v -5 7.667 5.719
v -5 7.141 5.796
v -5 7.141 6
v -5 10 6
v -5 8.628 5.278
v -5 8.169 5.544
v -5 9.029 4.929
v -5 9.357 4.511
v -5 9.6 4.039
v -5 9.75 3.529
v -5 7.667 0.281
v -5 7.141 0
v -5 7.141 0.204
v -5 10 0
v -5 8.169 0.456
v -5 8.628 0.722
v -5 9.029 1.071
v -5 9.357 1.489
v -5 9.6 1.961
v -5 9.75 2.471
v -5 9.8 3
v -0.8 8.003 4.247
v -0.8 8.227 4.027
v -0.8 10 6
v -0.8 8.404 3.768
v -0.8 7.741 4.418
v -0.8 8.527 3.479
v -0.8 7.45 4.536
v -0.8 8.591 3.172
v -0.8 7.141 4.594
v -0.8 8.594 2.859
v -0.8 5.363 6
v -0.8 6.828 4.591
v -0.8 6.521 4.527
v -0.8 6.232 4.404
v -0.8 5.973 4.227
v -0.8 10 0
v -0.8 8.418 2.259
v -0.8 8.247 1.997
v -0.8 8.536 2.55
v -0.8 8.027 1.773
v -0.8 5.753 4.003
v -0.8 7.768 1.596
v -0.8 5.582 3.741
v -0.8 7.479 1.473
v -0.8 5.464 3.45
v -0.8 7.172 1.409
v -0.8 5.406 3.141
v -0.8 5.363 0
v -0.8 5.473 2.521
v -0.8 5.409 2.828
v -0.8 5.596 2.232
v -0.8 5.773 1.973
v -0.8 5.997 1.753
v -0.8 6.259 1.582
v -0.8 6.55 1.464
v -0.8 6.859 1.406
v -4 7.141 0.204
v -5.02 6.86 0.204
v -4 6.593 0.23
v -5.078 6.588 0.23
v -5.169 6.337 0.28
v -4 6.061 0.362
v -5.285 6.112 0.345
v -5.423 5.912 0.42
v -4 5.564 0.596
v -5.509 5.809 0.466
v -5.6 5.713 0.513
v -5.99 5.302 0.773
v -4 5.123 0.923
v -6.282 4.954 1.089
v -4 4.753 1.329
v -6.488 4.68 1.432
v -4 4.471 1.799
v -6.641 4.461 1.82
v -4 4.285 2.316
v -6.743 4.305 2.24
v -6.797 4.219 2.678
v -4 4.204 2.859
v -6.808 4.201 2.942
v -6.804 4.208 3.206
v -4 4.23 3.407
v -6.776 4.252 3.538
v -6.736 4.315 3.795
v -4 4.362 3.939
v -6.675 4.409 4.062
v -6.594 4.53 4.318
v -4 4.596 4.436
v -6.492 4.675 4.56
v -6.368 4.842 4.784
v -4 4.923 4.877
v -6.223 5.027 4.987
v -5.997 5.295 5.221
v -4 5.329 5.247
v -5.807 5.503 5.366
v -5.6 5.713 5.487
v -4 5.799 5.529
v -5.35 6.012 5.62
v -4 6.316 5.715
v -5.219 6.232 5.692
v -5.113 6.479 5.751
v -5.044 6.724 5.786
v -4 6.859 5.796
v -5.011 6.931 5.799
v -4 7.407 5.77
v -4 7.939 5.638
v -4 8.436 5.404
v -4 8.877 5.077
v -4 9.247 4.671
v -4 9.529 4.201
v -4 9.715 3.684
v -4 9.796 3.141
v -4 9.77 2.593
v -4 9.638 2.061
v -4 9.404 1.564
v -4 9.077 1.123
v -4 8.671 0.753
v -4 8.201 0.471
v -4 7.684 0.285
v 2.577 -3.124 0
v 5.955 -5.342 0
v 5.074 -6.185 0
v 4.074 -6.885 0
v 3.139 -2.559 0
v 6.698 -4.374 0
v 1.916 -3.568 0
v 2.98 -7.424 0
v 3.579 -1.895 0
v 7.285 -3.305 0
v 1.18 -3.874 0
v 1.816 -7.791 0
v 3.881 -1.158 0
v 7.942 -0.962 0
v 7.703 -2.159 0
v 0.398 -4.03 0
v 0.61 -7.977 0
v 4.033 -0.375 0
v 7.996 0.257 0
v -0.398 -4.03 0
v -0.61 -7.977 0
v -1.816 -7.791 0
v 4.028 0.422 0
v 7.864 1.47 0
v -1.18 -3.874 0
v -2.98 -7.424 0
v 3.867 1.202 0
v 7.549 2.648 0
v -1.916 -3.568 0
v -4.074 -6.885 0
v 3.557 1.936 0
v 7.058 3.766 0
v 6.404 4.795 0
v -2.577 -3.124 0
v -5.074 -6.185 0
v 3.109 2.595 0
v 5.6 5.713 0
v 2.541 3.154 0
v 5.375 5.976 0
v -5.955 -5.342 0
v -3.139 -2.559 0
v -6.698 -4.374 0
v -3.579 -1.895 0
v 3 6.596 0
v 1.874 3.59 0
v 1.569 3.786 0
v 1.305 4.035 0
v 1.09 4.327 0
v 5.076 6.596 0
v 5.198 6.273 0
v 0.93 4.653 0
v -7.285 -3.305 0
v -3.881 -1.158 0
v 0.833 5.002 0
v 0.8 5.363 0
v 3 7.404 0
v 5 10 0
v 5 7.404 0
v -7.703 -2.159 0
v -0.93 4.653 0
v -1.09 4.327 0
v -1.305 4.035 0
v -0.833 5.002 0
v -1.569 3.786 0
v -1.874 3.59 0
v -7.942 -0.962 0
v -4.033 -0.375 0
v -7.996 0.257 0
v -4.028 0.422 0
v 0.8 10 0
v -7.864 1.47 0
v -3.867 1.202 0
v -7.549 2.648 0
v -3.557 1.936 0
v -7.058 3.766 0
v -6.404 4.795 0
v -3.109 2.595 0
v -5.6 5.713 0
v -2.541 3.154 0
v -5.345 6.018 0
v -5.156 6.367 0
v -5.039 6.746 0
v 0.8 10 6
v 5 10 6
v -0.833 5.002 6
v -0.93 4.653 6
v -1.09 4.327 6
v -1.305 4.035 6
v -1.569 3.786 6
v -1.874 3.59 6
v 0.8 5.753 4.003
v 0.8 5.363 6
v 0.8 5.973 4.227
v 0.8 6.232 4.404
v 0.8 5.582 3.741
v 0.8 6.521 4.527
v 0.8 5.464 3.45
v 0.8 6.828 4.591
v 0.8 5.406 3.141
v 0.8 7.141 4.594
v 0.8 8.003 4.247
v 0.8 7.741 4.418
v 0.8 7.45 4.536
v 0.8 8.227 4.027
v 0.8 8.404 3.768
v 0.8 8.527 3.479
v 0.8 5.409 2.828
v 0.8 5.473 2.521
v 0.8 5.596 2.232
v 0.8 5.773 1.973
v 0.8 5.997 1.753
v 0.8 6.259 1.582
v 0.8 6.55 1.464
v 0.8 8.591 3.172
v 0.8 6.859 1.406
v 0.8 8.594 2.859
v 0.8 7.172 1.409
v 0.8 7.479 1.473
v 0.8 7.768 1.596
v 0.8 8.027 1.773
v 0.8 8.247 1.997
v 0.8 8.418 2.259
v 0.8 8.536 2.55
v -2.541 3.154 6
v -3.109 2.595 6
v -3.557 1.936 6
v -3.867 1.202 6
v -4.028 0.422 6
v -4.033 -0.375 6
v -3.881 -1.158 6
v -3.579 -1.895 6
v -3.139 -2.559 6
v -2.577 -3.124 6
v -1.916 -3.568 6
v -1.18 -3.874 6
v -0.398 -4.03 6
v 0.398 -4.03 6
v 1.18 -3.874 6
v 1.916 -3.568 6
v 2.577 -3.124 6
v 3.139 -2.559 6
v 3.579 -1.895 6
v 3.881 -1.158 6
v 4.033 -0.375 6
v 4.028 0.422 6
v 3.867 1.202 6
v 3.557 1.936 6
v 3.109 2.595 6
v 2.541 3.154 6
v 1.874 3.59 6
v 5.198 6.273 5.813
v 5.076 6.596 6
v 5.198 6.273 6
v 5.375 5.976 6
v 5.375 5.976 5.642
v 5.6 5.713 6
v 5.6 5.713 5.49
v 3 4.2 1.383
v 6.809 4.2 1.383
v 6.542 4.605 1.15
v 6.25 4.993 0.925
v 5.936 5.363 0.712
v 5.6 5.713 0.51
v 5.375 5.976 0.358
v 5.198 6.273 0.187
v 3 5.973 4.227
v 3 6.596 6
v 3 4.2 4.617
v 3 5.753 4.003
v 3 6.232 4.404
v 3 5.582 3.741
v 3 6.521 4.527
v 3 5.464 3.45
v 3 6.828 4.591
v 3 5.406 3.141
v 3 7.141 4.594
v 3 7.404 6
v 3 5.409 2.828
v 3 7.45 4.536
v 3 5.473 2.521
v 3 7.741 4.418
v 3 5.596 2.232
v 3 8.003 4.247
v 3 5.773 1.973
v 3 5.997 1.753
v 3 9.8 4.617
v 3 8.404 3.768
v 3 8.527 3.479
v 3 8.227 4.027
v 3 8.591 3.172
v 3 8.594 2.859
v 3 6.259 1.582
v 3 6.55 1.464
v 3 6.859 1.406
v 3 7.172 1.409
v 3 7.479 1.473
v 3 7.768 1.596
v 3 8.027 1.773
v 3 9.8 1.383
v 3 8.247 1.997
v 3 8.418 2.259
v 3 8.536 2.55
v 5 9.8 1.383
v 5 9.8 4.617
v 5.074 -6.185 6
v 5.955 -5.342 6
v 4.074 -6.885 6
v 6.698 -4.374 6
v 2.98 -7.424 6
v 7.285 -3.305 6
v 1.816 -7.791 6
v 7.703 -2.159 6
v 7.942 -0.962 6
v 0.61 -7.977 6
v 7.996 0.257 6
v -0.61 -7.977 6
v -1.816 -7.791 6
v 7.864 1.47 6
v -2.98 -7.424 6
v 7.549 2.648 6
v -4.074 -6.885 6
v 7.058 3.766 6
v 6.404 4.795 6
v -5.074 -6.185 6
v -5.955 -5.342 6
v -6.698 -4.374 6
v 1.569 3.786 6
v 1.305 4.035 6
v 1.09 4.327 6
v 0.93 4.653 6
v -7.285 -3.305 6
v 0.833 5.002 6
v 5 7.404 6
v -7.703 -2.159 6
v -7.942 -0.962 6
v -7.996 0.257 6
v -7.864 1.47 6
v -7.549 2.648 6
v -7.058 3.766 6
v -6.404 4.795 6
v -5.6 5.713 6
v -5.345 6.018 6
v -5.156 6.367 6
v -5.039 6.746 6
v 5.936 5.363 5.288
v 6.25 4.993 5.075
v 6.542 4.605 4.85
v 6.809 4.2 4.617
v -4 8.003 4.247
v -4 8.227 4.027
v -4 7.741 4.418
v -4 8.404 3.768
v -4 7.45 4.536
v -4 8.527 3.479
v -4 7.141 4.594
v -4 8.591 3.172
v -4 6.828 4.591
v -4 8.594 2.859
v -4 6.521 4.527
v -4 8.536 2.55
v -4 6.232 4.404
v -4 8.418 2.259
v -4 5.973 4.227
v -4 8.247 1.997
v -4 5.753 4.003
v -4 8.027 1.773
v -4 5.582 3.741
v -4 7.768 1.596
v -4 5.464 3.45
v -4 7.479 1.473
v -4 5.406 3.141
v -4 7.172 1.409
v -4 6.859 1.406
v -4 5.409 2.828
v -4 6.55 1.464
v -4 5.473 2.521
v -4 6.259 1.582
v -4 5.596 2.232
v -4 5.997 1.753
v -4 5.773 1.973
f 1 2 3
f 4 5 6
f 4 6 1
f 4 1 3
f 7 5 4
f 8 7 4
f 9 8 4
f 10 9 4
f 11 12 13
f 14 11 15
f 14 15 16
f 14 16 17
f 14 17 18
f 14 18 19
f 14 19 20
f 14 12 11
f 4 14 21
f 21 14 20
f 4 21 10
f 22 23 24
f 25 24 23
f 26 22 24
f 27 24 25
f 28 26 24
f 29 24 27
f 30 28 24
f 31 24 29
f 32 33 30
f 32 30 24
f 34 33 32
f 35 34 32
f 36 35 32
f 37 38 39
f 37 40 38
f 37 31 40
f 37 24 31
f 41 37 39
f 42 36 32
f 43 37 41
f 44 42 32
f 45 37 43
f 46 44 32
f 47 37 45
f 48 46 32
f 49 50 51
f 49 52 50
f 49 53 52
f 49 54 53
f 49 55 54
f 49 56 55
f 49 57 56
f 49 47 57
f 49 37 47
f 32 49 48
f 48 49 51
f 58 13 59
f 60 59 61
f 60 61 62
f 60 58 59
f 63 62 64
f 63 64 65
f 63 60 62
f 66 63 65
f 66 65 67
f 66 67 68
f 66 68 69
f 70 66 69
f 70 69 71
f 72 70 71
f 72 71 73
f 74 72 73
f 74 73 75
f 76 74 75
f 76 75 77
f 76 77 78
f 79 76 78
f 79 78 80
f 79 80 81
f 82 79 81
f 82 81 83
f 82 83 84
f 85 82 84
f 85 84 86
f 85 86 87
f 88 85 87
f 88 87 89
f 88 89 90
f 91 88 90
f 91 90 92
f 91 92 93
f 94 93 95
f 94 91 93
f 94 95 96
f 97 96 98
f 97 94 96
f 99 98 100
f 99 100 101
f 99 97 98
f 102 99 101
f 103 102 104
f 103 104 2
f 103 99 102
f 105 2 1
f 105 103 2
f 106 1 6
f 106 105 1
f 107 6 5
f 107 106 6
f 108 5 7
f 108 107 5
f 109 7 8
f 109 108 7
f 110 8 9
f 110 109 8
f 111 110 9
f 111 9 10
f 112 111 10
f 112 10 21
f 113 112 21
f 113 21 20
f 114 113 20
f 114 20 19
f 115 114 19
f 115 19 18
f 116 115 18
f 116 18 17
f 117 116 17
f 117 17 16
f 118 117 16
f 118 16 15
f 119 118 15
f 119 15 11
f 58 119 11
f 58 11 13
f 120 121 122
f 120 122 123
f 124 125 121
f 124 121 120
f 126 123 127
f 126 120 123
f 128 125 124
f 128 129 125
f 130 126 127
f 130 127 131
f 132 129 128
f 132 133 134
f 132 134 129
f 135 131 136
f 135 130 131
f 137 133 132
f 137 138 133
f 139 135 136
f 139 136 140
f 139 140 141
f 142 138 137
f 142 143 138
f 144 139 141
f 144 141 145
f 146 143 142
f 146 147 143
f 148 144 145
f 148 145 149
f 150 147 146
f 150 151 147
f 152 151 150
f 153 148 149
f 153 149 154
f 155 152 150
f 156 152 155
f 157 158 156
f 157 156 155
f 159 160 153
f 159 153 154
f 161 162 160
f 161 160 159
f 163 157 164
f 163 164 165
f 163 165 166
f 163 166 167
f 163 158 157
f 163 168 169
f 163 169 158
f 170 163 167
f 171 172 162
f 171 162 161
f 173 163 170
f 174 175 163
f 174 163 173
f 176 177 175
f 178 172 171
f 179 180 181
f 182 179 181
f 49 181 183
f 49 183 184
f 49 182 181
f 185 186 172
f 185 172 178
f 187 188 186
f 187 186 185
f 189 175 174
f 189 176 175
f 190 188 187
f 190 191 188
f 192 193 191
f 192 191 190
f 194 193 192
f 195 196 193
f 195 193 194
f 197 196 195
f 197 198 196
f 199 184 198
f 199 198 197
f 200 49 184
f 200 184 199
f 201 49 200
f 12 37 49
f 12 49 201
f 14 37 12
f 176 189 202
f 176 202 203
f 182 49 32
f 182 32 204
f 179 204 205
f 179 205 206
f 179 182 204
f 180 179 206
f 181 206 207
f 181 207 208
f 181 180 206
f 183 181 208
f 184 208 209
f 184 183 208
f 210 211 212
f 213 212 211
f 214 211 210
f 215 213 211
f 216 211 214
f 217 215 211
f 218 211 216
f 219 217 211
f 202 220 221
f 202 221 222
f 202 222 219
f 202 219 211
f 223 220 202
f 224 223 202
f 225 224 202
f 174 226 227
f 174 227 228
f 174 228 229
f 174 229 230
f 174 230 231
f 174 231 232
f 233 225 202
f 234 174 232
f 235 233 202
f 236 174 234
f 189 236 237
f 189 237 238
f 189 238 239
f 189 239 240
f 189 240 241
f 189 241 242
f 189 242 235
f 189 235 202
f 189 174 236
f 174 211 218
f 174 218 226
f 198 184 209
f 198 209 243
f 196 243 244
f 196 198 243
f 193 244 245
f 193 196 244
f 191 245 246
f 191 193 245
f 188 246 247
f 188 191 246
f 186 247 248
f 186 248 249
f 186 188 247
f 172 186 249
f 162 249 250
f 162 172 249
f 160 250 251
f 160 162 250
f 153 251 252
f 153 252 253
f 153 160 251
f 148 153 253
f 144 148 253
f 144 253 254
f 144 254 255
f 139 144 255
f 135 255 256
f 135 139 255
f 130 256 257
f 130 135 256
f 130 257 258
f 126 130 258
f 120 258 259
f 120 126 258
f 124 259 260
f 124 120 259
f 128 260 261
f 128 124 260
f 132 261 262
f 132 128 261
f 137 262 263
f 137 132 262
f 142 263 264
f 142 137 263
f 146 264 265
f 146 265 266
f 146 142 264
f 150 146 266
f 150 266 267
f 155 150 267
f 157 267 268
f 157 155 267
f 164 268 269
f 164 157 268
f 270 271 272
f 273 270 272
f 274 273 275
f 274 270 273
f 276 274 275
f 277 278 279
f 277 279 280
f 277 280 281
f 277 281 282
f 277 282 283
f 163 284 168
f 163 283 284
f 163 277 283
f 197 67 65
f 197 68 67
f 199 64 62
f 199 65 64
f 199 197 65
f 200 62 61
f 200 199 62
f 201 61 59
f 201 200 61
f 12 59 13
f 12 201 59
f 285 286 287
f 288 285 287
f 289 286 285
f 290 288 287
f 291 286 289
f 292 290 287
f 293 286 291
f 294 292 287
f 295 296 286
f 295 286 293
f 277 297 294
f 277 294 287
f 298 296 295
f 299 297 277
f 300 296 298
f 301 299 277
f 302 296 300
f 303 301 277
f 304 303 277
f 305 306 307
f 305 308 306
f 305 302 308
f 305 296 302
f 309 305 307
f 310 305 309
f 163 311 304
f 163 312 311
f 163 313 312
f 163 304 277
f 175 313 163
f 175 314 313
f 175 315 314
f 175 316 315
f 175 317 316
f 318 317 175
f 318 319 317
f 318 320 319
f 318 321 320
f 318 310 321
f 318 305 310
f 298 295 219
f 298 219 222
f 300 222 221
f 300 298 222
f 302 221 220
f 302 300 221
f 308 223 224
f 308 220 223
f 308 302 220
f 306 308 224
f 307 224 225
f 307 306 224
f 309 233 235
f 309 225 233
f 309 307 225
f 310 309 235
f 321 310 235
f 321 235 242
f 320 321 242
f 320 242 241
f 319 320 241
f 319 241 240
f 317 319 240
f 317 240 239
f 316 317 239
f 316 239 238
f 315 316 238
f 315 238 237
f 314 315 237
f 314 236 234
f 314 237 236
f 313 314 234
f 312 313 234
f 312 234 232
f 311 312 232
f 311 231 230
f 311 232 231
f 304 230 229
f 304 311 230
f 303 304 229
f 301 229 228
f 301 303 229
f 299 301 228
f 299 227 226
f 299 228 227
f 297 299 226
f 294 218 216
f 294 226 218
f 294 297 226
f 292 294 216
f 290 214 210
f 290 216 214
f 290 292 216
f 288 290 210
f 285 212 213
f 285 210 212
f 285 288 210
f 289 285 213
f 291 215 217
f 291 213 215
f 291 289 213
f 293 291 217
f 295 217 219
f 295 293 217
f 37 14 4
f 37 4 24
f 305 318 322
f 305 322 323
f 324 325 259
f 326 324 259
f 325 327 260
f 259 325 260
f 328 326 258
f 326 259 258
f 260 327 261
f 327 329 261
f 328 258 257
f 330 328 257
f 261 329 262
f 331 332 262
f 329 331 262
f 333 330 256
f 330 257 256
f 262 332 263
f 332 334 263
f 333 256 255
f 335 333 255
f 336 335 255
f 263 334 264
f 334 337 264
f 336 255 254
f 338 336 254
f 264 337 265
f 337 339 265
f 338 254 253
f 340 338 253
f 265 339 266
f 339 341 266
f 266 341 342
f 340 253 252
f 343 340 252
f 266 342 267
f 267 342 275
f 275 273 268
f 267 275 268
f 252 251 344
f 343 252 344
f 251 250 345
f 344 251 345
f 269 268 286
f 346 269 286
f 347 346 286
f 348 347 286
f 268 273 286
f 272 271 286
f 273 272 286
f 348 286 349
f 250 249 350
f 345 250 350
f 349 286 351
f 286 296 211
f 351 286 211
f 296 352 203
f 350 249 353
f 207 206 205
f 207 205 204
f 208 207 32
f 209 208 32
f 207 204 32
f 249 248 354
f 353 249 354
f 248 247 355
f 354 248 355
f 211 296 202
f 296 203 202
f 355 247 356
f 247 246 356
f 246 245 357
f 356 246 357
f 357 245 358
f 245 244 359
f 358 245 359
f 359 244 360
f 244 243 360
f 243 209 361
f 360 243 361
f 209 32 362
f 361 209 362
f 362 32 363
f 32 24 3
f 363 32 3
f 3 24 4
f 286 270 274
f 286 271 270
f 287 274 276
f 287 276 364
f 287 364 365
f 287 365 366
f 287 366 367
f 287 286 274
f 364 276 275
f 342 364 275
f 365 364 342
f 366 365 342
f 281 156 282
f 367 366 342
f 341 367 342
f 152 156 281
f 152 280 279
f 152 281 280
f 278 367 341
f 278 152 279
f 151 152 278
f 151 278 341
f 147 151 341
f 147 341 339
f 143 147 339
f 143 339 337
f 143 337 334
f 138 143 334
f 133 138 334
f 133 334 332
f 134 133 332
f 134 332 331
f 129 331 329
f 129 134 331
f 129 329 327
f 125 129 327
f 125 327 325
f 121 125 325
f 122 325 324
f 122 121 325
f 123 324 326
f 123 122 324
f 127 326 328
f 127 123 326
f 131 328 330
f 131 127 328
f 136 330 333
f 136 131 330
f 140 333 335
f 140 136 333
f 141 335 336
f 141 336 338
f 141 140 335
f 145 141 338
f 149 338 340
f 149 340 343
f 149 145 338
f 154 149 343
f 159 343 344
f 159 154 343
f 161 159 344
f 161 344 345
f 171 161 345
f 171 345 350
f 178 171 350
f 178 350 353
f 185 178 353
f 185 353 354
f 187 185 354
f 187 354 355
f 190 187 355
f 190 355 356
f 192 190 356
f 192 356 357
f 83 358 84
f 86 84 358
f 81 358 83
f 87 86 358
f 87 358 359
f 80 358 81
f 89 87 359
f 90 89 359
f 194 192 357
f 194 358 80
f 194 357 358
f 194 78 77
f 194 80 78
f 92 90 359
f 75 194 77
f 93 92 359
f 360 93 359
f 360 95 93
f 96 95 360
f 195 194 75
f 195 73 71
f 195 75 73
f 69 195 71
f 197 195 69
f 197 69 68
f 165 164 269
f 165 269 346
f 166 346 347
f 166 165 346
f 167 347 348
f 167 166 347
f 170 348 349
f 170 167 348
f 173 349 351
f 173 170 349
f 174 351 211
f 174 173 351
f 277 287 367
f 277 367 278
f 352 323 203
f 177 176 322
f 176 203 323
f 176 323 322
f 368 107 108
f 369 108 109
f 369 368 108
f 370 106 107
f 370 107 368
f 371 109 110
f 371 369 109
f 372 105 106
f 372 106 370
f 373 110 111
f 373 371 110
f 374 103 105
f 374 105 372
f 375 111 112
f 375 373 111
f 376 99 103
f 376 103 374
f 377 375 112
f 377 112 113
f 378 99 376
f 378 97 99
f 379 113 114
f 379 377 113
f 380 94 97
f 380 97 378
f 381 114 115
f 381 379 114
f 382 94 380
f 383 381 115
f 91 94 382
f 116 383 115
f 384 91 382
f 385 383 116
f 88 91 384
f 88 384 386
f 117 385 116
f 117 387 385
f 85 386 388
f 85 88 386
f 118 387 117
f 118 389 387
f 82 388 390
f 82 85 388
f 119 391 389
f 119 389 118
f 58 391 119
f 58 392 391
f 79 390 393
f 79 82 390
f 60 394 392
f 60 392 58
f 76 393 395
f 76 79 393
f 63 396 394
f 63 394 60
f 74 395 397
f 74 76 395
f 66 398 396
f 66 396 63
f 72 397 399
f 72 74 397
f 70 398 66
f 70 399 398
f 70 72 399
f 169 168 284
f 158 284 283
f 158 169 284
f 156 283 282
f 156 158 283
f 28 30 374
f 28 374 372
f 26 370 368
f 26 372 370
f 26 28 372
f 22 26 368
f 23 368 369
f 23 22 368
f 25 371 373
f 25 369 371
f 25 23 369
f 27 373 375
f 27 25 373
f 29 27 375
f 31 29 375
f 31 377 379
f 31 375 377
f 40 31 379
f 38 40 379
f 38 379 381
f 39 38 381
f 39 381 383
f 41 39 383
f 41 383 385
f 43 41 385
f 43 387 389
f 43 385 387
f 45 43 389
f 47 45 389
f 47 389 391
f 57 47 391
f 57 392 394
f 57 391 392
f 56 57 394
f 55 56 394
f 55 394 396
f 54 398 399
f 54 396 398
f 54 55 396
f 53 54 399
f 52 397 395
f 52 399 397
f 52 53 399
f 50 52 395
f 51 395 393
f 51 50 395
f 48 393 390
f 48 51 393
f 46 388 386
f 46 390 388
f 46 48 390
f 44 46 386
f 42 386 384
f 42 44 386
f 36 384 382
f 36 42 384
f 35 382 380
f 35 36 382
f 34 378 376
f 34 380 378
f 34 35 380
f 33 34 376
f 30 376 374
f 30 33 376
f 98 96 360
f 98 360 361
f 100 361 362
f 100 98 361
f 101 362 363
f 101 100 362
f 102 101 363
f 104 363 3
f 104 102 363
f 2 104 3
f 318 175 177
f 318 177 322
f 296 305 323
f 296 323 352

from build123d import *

# Parameters (mm, degrees)
EXTRUDE_1_DEPTH          = 6
CUT_EXTRUDE_1_DEPTH      = 18.464249197
CUT_EXTRUDE_1_DEPTH_BACK = 18.464249197
SKETCH_2_R               = 1.6
SKETCH_3_R               = 2.8
CUT_EXTRUDE_2_DEPTH      = 17.733200638
CUT_EXTRUDE_3_DEPTH      = 17.031219648


with BuildPart() as part:
    # 草图1 → 凸台-拉伸1 (new body)
    with BuildSketch(Plane.XY):
        with BuildLine():
            Line((-5, 7.141428429), (-5, 10))
            Line((-5, 10), (-0.8, 10))
            Line((-0.8, 10), (-0.8, 5.363068152))
            ThreePointArc((-0.8, 5.363068152), (-1.089555662, 4.326545038), (-1.874380165, 3.59015306))
            ThreePointArc((-1.874380165, 3.59015306), (0, -4.05), (1.874380165, 3.59015306))
            ThreePointArc((1.874380165, 3.59015306), (1.089555662, 4.326545038), (0.8, 5.363068152))
            Line((0.8, 5.363068152), (0.8, 10))
            Line((0.8, 10), (5, 10))
            Line((5, 10), (5, 7.141428429))
            ThreePointArc((5, 7.141428429), (5.156091109, 6.366831759), (5.6, 5.713142743))
            ThreePointArc((5.6, 5.713142743), (0, -8), (-5.6, 5.713142743))
            ThreePointArc((-5.6, 5.713142743), (-5.156091109, 6.366831759), (-5, 7.141428429))
        make_face()
    extrude(amount=EXTRUDE_1_DEPTH)

    # 草图2 → 切除-拉伸1 (cut, two sides: drawn at the far end of the back side and taken through both)
    with BuildSketch(Plane.ZY.offset(5).offset(-CUT_EXTRUDE_1_DEPTH_BACK)):
        with Locations(Location((3, 7, 0), (0, 0, 5.071150936))):
            Circle(SKETCH_2_R)
    extrude(amount=CUT_EXTRUDE_1_DEPTH + CUT_EXTRUDE_1_DEPTH_BACK, mode=Mode.SUBTRACT)

    # 草图3 → 切除-拉伸2 (cut, through all)
    with BuildSketch(Plane.ZY.offset(4)):
        with Locations(Location((3, 7, 0), (0, 0, 177.10474942))):
            Circle(SKETCH_3_R)
    extrude(amount=CUT_EXTRUDE_2_DEPTH, mode=Mode.SUBTRACT)

    # 草图4 → 切除-拉伸3 (cut, through all)
    with BuildSketch(Plane(origin=(3, 0, 0), x_dir=(0, 0, -1), z_dir=(1, 0, 0))):
        Polygon((0.233161507, 7), (-1.383419246, 9.8), (-4.616580754, 9.8), (-6.233161507, 7), (-4.616580754, 4.2), (-1.383419246, 4.2), align=None)
    extrude(amount=CUT_EXTRUDE_3_DEPTH, mode=Mode.SUBTRACT)


solid = part.part
